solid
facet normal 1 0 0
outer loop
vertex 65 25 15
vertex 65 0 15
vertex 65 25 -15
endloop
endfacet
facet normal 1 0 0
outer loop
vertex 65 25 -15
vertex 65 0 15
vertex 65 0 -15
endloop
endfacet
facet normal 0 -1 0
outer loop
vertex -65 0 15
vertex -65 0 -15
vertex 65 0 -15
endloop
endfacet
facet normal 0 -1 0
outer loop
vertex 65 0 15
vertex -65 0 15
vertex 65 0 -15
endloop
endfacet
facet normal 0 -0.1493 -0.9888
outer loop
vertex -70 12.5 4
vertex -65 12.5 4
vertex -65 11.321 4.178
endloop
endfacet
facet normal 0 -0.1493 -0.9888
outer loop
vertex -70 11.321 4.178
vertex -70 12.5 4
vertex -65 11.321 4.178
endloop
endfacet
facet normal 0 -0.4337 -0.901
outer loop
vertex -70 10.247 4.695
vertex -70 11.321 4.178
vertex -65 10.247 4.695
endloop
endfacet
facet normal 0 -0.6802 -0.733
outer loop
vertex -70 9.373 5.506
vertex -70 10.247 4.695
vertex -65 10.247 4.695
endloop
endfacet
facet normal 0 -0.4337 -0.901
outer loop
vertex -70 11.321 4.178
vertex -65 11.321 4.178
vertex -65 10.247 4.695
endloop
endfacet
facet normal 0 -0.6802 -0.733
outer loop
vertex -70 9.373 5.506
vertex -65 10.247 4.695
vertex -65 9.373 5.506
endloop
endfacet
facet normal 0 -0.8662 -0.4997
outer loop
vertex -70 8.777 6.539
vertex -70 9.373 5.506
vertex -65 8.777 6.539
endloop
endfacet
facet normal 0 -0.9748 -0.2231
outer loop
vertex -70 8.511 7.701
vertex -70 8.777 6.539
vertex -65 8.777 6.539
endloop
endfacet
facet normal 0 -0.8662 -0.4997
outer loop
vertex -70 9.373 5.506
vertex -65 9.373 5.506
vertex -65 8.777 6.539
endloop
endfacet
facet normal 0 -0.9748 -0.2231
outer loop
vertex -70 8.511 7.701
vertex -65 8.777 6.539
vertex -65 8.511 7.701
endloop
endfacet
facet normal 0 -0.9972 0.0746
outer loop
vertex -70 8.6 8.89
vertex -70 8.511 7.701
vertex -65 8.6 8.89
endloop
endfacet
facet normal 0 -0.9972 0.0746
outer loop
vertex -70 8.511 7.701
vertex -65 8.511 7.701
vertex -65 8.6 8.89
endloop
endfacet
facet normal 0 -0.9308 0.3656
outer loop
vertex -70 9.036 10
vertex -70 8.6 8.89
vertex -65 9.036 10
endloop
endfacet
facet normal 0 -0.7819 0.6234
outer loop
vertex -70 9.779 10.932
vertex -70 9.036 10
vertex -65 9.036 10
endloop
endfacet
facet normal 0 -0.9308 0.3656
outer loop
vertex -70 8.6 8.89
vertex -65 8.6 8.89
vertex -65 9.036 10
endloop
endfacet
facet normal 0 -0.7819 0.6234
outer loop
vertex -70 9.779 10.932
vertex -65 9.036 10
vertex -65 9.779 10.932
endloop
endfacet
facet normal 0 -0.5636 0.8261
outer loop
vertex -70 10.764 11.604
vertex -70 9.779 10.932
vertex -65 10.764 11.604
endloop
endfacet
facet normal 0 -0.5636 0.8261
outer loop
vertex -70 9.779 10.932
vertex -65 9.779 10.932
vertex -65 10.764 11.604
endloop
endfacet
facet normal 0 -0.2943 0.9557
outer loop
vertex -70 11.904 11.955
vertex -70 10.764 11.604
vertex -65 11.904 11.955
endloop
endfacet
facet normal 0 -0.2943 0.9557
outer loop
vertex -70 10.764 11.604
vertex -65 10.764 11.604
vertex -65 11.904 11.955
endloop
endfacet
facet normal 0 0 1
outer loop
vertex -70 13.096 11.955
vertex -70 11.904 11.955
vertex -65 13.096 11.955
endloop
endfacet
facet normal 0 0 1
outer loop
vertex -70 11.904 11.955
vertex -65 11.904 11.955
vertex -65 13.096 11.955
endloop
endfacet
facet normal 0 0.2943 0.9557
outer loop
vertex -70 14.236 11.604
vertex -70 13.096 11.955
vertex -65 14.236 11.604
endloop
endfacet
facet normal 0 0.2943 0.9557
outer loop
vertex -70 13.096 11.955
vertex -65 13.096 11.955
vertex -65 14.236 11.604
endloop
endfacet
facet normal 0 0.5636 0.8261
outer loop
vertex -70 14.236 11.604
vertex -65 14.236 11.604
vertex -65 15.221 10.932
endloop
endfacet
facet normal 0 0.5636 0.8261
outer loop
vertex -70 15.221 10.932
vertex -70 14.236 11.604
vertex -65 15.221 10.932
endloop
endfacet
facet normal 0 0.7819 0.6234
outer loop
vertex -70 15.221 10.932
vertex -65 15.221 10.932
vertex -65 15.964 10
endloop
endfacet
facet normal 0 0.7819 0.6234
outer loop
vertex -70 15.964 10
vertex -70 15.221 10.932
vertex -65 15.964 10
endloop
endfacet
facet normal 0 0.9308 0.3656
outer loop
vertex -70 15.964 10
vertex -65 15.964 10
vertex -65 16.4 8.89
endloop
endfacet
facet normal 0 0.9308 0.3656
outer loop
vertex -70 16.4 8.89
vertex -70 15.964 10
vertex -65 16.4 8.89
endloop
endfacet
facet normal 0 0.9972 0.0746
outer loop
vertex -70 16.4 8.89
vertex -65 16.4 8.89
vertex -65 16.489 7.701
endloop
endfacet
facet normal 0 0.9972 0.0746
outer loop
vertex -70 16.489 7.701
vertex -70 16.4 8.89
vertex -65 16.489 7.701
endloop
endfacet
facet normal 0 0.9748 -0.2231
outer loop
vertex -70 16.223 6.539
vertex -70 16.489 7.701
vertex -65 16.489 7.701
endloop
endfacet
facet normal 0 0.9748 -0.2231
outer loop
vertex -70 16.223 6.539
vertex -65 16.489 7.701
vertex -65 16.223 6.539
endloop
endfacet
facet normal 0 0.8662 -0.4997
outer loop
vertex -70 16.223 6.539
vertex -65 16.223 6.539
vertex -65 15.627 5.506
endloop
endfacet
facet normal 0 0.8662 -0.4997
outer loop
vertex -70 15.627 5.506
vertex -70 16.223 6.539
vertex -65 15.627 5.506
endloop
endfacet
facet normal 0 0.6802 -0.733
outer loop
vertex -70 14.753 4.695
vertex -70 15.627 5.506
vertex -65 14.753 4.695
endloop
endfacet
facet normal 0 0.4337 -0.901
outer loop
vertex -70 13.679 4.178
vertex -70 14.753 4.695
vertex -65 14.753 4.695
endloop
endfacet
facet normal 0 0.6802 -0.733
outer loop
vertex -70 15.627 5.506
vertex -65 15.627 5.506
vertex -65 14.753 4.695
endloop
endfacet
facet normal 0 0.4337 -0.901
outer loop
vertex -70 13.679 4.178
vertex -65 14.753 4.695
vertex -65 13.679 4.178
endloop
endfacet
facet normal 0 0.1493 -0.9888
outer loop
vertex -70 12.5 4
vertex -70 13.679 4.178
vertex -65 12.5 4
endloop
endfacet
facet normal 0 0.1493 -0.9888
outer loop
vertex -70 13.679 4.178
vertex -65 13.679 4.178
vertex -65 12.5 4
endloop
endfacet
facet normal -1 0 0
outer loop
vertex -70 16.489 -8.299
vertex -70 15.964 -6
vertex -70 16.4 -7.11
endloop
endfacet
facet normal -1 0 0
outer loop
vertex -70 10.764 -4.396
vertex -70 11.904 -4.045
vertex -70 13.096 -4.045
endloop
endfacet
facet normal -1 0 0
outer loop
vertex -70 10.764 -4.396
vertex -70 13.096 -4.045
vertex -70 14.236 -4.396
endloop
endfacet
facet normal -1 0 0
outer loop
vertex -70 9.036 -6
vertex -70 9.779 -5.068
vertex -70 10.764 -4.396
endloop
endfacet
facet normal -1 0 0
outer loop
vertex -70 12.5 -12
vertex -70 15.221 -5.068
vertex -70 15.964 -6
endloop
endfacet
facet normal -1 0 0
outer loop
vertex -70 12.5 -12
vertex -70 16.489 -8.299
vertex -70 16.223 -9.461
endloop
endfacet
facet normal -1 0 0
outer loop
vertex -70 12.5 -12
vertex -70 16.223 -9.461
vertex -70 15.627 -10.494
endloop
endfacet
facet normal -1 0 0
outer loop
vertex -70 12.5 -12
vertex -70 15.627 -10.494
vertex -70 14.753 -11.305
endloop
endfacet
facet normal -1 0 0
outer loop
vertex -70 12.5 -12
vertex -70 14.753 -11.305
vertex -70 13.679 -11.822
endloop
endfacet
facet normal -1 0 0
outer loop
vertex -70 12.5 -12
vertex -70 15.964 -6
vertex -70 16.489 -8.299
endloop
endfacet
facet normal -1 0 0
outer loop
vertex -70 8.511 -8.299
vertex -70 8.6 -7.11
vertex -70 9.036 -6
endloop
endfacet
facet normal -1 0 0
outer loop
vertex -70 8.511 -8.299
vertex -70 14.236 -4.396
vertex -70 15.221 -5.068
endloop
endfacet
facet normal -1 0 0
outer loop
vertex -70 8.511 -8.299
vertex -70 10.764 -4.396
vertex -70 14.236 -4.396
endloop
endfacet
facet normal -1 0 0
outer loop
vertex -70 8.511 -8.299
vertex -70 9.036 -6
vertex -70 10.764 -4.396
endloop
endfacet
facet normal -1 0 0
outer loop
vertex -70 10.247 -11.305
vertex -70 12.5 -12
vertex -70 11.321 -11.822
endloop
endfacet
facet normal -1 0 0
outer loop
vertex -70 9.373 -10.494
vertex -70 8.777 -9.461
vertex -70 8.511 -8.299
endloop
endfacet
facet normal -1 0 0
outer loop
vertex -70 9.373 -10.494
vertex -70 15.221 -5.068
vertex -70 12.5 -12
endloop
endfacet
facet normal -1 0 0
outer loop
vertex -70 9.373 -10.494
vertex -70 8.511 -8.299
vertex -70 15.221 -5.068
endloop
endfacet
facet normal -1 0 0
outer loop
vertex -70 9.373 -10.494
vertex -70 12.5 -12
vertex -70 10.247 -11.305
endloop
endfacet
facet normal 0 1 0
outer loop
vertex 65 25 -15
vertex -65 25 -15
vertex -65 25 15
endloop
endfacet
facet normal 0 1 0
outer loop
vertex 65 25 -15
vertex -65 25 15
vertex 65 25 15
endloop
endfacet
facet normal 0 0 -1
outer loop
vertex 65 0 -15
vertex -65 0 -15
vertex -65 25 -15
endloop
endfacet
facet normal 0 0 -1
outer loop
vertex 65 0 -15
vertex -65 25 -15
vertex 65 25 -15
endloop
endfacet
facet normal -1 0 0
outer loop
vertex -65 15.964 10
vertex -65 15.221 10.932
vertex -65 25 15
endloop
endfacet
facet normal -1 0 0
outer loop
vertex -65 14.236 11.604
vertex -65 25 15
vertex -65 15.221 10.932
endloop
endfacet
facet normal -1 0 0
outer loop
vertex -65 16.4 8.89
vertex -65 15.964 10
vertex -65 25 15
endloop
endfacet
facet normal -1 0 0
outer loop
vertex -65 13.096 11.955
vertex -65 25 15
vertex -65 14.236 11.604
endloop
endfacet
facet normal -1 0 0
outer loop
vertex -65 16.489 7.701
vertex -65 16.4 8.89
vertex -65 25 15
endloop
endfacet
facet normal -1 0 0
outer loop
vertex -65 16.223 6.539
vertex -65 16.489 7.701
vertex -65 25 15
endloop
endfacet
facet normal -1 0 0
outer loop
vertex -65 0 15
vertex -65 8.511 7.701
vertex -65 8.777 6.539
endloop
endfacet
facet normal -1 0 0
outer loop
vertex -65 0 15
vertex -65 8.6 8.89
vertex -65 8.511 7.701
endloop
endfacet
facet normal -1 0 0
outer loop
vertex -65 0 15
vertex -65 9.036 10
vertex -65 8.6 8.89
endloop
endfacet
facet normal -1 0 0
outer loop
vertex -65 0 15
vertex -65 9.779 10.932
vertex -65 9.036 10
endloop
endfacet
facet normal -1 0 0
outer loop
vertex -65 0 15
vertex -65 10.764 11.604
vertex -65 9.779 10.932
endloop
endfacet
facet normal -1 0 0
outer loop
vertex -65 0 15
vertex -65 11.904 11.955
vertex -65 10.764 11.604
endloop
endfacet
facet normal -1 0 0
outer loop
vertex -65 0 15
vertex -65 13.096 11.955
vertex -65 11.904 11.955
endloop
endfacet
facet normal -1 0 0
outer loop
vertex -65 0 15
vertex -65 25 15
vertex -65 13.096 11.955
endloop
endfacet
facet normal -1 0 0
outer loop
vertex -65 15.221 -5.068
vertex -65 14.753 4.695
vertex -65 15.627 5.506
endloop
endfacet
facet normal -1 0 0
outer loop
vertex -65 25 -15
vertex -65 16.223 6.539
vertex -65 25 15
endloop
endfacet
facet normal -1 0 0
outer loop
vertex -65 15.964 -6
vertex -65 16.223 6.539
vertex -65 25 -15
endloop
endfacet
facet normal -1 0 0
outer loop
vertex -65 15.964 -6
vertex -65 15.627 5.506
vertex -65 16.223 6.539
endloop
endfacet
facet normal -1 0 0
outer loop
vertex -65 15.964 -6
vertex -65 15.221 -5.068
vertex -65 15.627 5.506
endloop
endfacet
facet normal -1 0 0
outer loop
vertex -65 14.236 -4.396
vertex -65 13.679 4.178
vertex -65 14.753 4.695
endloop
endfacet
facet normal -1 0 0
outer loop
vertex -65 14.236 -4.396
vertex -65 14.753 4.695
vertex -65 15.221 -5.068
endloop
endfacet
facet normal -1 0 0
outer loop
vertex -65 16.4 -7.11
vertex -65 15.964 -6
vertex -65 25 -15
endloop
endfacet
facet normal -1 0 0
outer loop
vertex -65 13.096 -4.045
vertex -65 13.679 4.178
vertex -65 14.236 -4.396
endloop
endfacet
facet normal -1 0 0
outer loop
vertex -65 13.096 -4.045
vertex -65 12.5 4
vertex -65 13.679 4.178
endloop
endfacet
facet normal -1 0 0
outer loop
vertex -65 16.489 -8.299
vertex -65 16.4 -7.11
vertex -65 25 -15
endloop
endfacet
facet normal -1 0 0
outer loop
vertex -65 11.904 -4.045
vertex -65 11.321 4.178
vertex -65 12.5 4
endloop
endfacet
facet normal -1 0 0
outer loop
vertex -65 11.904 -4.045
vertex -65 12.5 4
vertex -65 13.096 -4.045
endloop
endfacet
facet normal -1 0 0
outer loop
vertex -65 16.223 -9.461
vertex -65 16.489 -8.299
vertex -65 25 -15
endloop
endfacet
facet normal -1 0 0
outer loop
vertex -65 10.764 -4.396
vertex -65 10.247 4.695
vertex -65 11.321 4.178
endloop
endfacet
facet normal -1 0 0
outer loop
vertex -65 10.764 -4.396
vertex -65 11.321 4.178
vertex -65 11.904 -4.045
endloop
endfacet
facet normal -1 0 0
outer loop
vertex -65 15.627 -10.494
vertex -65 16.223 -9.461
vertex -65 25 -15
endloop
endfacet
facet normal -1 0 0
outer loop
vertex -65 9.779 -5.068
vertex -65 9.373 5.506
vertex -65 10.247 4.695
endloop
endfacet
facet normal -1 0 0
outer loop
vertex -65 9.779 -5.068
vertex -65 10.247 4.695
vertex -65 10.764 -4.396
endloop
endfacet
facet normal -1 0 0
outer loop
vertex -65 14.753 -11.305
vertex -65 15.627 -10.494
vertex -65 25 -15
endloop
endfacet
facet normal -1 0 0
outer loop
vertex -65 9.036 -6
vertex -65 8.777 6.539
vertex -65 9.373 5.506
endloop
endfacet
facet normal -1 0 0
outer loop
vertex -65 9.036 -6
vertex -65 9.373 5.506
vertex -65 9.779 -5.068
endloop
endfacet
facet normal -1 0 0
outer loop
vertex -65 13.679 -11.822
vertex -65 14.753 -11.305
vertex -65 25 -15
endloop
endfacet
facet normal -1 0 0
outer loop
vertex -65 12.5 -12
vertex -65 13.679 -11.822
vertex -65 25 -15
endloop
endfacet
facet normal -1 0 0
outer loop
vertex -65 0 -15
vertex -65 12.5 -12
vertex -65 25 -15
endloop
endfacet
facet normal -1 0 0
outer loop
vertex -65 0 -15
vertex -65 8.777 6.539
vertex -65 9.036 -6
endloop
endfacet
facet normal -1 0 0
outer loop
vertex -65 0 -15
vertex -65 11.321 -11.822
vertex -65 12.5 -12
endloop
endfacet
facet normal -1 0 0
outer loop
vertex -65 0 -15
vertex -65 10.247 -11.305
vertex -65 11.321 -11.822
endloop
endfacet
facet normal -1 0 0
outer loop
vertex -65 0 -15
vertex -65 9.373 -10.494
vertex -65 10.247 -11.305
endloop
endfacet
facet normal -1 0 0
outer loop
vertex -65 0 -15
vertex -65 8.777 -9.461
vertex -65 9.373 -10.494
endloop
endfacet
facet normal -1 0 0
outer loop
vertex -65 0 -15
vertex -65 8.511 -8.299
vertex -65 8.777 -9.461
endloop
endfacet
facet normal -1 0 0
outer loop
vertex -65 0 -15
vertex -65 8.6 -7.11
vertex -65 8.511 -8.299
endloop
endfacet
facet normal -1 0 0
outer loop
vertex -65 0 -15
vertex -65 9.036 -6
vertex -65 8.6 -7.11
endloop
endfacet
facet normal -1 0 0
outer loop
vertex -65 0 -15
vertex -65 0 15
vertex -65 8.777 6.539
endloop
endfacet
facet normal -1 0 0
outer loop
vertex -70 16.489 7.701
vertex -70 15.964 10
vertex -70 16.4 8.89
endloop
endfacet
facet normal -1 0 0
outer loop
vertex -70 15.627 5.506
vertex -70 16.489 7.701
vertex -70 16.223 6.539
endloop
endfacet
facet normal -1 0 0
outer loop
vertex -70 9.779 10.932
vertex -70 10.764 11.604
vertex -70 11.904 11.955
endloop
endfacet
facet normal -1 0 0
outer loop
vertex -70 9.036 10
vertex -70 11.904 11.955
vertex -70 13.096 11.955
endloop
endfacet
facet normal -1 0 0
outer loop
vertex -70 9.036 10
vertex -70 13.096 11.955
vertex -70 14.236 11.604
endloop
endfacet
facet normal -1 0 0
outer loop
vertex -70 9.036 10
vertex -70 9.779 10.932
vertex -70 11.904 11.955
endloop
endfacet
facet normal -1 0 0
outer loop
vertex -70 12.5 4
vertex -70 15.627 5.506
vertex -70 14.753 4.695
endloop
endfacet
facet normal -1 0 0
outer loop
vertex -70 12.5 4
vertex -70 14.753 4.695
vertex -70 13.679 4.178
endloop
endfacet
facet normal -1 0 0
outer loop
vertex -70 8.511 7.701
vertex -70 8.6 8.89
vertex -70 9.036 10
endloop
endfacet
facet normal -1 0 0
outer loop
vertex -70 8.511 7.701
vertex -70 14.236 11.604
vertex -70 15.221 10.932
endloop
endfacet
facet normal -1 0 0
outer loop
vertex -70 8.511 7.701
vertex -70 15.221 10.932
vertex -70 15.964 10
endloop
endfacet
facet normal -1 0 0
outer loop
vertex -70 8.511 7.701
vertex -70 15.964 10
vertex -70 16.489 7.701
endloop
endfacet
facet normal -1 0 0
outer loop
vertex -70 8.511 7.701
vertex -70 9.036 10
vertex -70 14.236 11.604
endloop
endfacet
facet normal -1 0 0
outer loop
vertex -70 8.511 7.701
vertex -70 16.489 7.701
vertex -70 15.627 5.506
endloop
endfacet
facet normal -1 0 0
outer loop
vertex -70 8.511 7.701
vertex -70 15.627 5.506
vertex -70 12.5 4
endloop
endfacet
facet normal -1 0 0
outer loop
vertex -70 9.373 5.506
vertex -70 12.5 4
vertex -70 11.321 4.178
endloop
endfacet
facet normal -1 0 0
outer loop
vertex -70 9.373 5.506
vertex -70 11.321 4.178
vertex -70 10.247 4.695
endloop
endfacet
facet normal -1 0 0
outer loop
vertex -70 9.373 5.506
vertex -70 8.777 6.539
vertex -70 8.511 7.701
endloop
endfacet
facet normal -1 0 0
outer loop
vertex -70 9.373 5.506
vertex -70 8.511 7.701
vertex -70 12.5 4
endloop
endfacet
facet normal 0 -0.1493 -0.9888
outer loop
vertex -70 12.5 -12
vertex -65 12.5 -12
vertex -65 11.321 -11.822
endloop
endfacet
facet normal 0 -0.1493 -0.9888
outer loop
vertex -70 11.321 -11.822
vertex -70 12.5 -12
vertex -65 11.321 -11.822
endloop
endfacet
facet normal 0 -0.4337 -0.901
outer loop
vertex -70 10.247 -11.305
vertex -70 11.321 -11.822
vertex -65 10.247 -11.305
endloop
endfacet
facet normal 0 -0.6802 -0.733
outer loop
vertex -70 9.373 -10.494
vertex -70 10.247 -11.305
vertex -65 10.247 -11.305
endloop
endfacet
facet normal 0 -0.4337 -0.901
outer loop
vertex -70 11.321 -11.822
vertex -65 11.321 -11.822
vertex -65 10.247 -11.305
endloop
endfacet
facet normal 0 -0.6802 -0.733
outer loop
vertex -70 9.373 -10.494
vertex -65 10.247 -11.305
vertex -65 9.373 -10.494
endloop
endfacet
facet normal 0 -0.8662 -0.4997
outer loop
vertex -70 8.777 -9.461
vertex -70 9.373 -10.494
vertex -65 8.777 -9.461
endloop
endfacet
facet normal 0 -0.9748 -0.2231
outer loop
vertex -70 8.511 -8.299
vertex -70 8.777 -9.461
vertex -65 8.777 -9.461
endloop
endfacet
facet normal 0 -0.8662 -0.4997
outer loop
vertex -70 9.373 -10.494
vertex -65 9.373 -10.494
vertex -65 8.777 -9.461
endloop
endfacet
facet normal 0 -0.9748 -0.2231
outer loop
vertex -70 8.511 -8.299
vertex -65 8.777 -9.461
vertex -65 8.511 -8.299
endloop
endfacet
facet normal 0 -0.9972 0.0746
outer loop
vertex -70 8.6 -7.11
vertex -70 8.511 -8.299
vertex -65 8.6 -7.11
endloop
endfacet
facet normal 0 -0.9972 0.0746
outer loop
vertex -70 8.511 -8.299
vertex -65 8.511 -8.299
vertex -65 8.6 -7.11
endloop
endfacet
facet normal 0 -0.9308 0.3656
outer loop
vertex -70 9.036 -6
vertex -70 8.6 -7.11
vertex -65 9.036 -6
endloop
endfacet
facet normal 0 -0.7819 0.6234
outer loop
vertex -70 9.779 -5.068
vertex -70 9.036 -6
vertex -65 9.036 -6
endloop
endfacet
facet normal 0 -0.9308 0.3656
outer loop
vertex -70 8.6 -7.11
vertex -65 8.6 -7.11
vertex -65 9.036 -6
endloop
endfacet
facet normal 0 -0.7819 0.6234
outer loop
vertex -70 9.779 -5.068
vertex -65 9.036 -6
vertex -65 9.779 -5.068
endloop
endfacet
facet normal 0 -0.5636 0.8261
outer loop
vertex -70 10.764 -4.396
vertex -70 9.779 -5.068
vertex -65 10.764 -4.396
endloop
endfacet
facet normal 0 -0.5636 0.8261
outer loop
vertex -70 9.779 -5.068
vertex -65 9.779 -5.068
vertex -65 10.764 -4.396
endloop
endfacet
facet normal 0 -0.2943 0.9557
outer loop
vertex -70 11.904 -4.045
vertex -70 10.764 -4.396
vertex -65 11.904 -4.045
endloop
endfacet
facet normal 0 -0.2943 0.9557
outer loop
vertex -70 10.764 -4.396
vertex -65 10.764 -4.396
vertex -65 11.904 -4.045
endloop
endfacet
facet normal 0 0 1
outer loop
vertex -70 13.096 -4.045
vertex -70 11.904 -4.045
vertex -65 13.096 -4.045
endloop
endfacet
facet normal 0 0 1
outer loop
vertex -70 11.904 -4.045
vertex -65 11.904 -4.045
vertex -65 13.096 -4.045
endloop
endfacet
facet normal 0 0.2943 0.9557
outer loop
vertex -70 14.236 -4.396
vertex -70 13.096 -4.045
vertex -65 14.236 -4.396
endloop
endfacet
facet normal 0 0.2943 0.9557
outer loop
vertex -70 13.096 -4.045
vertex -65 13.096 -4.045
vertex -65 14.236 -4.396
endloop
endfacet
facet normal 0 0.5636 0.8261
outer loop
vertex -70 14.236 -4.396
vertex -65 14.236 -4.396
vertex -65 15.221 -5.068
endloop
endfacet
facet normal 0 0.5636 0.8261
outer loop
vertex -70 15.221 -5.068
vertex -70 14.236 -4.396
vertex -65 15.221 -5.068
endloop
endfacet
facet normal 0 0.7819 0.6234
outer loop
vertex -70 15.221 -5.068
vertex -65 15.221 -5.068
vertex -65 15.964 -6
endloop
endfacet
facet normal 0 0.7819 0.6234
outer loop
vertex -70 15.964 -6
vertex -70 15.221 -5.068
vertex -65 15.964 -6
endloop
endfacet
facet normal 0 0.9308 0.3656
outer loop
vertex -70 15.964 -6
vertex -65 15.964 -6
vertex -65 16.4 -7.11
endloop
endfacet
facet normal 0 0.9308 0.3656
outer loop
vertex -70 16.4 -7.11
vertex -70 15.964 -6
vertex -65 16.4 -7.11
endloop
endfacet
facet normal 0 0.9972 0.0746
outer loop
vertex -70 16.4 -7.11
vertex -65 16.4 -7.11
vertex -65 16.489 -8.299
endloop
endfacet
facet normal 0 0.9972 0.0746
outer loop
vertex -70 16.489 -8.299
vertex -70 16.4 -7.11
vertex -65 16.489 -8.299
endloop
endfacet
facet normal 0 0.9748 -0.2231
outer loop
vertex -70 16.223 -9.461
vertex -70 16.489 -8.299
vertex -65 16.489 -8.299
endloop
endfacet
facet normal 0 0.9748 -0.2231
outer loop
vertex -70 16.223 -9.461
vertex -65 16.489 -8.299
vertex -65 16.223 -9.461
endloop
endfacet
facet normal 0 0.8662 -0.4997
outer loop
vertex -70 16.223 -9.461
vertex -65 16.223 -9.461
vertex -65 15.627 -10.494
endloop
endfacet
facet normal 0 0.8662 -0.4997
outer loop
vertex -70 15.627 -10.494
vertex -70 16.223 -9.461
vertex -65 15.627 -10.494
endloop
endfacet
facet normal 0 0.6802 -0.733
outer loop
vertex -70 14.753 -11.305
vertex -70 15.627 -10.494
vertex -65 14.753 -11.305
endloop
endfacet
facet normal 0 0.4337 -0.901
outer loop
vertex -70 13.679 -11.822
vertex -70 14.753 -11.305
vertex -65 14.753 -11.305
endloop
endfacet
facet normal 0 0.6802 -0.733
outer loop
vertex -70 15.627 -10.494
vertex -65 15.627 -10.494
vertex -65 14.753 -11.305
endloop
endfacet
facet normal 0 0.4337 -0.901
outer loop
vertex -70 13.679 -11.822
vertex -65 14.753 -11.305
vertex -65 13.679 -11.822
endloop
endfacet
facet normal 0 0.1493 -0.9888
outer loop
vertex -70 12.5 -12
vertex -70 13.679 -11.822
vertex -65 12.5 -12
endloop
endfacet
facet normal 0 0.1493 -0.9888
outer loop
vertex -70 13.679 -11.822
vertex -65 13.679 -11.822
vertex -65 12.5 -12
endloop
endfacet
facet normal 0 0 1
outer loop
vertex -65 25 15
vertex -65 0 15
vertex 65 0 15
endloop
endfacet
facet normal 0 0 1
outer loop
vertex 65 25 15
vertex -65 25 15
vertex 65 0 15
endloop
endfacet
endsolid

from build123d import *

# Parameters (mm, degrees)
SKETCH_1_W      = 130
SKETCH_1_H      = 30
EXTRUDE_1_DEPTH = 25
SKETCH_2_R      = 4
EXTRUDE_2_DEPTH = 5


with BuildPart() as part:
    # 草图1 → 凸台-拉伸1 (new body)
    with BuildSketch(Plane(origin=(0, 0, 0), x_dir=(1, 0, 0), z_dir=(0, 1, 0))):
        Rectangle(SKETCH_1_W, SKETCH_1_H)
    extrude(amount=EXTRUDE_1_DEPTH)

    # 草图2 → 凸台-拉伸2 (add)
    with BuildSketch(Plane.ZY.offset(65)):
        with Locations(Location((-8, 12.5, 0), (0, 0, 180))):
            Circle(SKETCH_2_R)
        with Locations(Location((8, 12.5, 0), (0, 0, 180))):
            Circle(SKETCH_2_R)
    extrude(amount=EXTRUDE_2_DEPTH)


solid = part.part
